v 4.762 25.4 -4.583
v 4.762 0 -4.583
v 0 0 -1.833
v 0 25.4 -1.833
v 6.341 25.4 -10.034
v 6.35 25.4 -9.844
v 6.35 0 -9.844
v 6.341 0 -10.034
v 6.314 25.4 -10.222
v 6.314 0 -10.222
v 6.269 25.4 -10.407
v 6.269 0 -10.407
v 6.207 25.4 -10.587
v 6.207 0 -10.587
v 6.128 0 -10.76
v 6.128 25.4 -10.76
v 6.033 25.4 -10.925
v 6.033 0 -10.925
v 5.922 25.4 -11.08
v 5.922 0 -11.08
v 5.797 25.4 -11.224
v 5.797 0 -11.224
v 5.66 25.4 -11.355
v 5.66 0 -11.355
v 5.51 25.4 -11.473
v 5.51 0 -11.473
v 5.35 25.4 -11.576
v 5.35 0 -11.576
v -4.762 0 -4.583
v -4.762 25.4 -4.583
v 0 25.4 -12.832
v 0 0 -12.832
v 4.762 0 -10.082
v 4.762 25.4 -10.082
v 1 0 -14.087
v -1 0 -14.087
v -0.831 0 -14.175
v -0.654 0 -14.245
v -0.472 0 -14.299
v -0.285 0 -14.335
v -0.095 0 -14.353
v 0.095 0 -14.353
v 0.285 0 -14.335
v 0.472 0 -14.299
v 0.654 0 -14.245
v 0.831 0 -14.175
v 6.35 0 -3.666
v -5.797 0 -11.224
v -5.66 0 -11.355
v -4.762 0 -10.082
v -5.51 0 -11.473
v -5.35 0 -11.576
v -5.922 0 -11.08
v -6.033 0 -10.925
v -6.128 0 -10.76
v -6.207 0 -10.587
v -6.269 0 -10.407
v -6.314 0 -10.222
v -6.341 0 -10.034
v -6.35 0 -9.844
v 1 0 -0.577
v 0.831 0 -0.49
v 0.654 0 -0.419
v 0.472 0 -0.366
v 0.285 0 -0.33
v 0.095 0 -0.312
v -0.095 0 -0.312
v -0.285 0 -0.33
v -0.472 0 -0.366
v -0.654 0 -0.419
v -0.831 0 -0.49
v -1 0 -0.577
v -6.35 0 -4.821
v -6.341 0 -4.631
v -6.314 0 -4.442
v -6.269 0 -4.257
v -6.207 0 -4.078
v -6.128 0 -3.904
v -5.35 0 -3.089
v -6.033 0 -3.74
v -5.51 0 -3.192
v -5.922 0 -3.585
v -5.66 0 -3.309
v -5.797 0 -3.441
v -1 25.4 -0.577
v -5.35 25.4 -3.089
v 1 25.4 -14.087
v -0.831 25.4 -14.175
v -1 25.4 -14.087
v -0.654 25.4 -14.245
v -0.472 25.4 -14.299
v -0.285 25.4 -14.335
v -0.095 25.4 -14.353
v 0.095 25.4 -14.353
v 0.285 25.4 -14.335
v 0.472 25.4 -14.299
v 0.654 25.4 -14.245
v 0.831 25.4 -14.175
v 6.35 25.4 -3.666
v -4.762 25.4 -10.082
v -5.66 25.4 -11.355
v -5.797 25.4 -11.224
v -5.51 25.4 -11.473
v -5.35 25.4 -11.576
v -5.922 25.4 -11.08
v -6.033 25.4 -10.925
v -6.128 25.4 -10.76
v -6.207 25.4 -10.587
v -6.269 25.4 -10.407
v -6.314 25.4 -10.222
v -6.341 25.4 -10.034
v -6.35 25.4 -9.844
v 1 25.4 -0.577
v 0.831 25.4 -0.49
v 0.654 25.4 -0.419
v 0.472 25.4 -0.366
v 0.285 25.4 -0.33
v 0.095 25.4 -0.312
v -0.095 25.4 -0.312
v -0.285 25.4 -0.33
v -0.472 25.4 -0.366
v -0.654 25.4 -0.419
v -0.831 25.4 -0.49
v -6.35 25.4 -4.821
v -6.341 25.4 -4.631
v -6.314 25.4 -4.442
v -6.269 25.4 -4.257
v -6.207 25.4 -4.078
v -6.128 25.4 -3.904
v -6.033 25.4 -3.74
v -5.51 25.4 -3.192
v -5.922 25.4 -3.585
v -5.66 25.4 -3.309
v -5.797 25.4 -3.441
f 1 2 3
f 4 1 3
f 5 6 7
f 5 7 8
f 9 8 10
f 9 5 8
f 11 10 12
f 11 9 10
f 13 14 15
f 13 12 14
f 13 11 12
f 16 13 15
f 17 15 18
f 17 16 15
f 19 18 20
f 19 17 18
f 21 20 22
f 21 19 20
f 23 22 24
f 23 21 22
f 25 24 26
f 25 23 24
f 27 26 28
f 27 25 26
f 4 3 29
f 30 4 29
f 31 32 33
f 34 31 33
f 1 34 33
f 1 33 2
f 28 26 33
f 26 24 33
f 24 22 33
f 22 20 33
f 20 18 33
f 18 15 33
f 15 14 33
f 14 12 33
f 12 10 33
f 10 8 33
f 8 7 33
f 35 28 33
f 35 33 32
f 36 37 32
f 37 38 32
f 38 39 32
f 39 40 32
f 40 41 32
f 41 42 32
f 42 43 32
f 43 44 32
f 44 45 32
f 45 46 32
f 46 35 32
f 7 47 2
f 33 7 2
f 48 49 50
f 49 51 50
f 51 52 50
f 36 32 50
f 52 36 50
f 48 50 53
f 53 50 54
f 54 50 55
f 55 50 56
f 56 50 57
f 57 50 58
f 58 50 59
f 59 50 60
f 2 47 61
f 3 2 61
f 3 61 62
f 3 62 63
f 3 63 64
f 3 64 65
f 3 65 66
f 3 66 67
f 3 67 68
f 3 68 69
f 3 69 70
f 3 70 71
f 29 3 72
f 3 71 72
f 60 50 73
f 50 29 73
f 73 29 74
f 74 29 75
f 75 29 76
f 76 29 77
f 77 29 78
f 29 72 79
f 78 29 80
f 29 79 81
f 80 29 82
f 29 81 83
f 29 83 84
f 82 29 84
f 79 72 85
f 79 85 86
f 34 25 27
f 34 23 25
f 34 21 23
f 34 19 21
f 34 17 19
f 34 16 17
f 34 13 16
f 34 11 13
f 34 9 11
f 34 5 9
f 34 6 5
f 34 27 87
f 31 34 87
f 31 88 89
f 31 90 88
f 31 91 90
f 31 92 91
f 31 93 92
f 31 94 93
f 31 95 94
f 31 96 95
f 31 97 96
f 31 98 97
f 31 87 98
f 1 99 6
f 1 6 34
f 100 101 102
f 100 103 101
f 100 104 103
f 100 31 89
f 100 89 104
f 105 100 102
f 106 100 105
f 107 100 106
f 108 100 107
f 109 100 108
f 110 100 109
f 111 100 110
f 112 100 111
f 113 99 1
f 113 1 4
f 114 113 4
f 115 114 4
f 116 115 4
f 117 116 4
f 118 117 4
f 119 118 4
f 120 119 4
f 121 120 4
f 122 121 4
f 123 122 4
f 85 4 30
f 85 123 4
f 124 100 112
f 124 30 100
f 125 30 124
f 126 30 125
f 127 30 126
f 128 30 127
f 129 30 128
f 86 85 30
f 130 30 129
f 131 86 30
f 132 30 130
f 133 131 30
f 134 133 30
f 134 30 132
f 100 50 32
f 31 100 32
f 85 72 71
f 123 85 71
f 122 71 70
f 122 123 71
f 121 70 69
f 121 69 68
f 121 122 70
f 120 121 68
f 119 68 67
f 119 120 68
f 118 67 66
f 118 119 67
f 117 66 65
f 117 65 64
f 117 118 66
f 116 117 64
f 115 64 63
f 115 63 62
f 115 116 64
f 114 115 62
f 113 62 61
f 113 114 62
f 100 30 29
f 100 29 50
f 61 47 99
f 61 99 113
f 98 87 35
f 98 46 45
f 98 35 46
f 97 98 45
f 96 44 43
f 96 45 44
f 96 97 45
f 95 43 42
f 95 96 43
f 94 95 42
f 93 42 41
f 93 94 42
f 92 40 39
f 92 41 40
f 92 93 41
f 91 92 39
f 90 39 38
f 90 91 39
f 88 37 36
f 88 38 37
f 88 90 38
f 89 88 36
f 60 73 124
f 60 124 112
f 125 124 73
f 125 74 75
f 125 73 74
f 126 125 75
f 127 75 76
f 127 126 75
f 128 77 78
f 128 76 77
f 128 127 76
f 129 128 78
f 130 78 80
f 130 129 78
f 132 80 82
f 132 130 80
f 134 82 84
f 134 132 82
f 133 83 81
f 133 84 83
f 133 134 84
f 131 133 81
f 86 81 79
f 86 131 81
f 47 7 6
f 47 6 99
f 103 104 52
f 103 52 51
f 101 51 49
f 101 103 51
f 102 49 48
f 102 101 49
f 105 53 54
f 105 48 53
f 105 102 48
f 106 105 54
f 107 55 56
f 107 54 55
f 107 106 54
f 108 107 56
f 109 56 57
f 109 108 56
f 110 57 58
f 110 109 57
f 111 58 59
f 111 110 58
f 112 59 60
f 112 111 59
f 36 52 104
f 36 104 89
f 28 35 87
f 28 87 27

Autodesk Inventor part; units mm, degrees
ref_plane "YZ Plane" through (0, 0, 0) normal (1, 0, 0) x (0, 1, 0)
ref_plane "XZ Plane" through (0, 0, 0) normal (0, 1, 0) x (-1, 0, 0)
ref_plane "XY Plane" through (0, 0, 0) normal (0, 0, 1) x (1, 0, 0)
sketch "Sketch1" plane through (0, 0, 0) normal (0, 1, 0) x (-1, 0, 0)
  line L0 (0, 0) -> (6.35, -3.6662)
  line L1 (6.35, -3.6662) -> (6.35, -10.9985)
  line L2 (6.35, -10.9985) -> (0, -14.6647)
  line L3 (0, -14.6647) -> (-6.35, -10.9985)
  line L4 (-6.35, -10.9985) -> (-6.35, -3.6662)
  line L5 (-6.35, -3.6662) -> (0, 0)
  line L6 (0, 0) -> (0, -14.6647) construction
  line L7 (6.35, -10.9985) -> (-6.35, -3.6662) construction
  line L8 (6.35, -3.6662) -> (-6.35, -10.9985) construction
  line L9 (0, -1.8331) -> (4.7625, -4.5827)
  line L10 (4.7625, -4.5827) -> (4.7625, -10.082)
  line L11 (4.7625, -10.082) -> (0, -12.8316)
  line L12 (0, -12.8316) -> (-4.7625, -10.082)
  line L13 (-4.7625, -10.082) -> (-4.7625, -4.5827)
  line L14 (-4.7625, -4.5827) -> (0, -1.8331)
  line L15 (4.7625, -4.5827) -> (-4.7625, -10.082) construction
  line L16 (0, -12.8316) -> (0, -1.8331) construction
  line L17 (4.7625, -10.082) -> (-4.7625, -4.5827) construction
  point P0 (0, -7.3323)
  dimension "d0" = 12.7
  dimension "d2" = 9.525
extrude "Extrusion1" add sketch "Sketch1" along normal blind 25.4
fillet "Fillet1" radius 2 5 edges at (0, 12.7, 0) (-6.35, 12.7, -3.6662) (-6.35, 12.7, -10.9985) (0, 12.7, -14.6647) (6.35, 12.7, -10.9985)
properties part number "arm wheel spacer"
